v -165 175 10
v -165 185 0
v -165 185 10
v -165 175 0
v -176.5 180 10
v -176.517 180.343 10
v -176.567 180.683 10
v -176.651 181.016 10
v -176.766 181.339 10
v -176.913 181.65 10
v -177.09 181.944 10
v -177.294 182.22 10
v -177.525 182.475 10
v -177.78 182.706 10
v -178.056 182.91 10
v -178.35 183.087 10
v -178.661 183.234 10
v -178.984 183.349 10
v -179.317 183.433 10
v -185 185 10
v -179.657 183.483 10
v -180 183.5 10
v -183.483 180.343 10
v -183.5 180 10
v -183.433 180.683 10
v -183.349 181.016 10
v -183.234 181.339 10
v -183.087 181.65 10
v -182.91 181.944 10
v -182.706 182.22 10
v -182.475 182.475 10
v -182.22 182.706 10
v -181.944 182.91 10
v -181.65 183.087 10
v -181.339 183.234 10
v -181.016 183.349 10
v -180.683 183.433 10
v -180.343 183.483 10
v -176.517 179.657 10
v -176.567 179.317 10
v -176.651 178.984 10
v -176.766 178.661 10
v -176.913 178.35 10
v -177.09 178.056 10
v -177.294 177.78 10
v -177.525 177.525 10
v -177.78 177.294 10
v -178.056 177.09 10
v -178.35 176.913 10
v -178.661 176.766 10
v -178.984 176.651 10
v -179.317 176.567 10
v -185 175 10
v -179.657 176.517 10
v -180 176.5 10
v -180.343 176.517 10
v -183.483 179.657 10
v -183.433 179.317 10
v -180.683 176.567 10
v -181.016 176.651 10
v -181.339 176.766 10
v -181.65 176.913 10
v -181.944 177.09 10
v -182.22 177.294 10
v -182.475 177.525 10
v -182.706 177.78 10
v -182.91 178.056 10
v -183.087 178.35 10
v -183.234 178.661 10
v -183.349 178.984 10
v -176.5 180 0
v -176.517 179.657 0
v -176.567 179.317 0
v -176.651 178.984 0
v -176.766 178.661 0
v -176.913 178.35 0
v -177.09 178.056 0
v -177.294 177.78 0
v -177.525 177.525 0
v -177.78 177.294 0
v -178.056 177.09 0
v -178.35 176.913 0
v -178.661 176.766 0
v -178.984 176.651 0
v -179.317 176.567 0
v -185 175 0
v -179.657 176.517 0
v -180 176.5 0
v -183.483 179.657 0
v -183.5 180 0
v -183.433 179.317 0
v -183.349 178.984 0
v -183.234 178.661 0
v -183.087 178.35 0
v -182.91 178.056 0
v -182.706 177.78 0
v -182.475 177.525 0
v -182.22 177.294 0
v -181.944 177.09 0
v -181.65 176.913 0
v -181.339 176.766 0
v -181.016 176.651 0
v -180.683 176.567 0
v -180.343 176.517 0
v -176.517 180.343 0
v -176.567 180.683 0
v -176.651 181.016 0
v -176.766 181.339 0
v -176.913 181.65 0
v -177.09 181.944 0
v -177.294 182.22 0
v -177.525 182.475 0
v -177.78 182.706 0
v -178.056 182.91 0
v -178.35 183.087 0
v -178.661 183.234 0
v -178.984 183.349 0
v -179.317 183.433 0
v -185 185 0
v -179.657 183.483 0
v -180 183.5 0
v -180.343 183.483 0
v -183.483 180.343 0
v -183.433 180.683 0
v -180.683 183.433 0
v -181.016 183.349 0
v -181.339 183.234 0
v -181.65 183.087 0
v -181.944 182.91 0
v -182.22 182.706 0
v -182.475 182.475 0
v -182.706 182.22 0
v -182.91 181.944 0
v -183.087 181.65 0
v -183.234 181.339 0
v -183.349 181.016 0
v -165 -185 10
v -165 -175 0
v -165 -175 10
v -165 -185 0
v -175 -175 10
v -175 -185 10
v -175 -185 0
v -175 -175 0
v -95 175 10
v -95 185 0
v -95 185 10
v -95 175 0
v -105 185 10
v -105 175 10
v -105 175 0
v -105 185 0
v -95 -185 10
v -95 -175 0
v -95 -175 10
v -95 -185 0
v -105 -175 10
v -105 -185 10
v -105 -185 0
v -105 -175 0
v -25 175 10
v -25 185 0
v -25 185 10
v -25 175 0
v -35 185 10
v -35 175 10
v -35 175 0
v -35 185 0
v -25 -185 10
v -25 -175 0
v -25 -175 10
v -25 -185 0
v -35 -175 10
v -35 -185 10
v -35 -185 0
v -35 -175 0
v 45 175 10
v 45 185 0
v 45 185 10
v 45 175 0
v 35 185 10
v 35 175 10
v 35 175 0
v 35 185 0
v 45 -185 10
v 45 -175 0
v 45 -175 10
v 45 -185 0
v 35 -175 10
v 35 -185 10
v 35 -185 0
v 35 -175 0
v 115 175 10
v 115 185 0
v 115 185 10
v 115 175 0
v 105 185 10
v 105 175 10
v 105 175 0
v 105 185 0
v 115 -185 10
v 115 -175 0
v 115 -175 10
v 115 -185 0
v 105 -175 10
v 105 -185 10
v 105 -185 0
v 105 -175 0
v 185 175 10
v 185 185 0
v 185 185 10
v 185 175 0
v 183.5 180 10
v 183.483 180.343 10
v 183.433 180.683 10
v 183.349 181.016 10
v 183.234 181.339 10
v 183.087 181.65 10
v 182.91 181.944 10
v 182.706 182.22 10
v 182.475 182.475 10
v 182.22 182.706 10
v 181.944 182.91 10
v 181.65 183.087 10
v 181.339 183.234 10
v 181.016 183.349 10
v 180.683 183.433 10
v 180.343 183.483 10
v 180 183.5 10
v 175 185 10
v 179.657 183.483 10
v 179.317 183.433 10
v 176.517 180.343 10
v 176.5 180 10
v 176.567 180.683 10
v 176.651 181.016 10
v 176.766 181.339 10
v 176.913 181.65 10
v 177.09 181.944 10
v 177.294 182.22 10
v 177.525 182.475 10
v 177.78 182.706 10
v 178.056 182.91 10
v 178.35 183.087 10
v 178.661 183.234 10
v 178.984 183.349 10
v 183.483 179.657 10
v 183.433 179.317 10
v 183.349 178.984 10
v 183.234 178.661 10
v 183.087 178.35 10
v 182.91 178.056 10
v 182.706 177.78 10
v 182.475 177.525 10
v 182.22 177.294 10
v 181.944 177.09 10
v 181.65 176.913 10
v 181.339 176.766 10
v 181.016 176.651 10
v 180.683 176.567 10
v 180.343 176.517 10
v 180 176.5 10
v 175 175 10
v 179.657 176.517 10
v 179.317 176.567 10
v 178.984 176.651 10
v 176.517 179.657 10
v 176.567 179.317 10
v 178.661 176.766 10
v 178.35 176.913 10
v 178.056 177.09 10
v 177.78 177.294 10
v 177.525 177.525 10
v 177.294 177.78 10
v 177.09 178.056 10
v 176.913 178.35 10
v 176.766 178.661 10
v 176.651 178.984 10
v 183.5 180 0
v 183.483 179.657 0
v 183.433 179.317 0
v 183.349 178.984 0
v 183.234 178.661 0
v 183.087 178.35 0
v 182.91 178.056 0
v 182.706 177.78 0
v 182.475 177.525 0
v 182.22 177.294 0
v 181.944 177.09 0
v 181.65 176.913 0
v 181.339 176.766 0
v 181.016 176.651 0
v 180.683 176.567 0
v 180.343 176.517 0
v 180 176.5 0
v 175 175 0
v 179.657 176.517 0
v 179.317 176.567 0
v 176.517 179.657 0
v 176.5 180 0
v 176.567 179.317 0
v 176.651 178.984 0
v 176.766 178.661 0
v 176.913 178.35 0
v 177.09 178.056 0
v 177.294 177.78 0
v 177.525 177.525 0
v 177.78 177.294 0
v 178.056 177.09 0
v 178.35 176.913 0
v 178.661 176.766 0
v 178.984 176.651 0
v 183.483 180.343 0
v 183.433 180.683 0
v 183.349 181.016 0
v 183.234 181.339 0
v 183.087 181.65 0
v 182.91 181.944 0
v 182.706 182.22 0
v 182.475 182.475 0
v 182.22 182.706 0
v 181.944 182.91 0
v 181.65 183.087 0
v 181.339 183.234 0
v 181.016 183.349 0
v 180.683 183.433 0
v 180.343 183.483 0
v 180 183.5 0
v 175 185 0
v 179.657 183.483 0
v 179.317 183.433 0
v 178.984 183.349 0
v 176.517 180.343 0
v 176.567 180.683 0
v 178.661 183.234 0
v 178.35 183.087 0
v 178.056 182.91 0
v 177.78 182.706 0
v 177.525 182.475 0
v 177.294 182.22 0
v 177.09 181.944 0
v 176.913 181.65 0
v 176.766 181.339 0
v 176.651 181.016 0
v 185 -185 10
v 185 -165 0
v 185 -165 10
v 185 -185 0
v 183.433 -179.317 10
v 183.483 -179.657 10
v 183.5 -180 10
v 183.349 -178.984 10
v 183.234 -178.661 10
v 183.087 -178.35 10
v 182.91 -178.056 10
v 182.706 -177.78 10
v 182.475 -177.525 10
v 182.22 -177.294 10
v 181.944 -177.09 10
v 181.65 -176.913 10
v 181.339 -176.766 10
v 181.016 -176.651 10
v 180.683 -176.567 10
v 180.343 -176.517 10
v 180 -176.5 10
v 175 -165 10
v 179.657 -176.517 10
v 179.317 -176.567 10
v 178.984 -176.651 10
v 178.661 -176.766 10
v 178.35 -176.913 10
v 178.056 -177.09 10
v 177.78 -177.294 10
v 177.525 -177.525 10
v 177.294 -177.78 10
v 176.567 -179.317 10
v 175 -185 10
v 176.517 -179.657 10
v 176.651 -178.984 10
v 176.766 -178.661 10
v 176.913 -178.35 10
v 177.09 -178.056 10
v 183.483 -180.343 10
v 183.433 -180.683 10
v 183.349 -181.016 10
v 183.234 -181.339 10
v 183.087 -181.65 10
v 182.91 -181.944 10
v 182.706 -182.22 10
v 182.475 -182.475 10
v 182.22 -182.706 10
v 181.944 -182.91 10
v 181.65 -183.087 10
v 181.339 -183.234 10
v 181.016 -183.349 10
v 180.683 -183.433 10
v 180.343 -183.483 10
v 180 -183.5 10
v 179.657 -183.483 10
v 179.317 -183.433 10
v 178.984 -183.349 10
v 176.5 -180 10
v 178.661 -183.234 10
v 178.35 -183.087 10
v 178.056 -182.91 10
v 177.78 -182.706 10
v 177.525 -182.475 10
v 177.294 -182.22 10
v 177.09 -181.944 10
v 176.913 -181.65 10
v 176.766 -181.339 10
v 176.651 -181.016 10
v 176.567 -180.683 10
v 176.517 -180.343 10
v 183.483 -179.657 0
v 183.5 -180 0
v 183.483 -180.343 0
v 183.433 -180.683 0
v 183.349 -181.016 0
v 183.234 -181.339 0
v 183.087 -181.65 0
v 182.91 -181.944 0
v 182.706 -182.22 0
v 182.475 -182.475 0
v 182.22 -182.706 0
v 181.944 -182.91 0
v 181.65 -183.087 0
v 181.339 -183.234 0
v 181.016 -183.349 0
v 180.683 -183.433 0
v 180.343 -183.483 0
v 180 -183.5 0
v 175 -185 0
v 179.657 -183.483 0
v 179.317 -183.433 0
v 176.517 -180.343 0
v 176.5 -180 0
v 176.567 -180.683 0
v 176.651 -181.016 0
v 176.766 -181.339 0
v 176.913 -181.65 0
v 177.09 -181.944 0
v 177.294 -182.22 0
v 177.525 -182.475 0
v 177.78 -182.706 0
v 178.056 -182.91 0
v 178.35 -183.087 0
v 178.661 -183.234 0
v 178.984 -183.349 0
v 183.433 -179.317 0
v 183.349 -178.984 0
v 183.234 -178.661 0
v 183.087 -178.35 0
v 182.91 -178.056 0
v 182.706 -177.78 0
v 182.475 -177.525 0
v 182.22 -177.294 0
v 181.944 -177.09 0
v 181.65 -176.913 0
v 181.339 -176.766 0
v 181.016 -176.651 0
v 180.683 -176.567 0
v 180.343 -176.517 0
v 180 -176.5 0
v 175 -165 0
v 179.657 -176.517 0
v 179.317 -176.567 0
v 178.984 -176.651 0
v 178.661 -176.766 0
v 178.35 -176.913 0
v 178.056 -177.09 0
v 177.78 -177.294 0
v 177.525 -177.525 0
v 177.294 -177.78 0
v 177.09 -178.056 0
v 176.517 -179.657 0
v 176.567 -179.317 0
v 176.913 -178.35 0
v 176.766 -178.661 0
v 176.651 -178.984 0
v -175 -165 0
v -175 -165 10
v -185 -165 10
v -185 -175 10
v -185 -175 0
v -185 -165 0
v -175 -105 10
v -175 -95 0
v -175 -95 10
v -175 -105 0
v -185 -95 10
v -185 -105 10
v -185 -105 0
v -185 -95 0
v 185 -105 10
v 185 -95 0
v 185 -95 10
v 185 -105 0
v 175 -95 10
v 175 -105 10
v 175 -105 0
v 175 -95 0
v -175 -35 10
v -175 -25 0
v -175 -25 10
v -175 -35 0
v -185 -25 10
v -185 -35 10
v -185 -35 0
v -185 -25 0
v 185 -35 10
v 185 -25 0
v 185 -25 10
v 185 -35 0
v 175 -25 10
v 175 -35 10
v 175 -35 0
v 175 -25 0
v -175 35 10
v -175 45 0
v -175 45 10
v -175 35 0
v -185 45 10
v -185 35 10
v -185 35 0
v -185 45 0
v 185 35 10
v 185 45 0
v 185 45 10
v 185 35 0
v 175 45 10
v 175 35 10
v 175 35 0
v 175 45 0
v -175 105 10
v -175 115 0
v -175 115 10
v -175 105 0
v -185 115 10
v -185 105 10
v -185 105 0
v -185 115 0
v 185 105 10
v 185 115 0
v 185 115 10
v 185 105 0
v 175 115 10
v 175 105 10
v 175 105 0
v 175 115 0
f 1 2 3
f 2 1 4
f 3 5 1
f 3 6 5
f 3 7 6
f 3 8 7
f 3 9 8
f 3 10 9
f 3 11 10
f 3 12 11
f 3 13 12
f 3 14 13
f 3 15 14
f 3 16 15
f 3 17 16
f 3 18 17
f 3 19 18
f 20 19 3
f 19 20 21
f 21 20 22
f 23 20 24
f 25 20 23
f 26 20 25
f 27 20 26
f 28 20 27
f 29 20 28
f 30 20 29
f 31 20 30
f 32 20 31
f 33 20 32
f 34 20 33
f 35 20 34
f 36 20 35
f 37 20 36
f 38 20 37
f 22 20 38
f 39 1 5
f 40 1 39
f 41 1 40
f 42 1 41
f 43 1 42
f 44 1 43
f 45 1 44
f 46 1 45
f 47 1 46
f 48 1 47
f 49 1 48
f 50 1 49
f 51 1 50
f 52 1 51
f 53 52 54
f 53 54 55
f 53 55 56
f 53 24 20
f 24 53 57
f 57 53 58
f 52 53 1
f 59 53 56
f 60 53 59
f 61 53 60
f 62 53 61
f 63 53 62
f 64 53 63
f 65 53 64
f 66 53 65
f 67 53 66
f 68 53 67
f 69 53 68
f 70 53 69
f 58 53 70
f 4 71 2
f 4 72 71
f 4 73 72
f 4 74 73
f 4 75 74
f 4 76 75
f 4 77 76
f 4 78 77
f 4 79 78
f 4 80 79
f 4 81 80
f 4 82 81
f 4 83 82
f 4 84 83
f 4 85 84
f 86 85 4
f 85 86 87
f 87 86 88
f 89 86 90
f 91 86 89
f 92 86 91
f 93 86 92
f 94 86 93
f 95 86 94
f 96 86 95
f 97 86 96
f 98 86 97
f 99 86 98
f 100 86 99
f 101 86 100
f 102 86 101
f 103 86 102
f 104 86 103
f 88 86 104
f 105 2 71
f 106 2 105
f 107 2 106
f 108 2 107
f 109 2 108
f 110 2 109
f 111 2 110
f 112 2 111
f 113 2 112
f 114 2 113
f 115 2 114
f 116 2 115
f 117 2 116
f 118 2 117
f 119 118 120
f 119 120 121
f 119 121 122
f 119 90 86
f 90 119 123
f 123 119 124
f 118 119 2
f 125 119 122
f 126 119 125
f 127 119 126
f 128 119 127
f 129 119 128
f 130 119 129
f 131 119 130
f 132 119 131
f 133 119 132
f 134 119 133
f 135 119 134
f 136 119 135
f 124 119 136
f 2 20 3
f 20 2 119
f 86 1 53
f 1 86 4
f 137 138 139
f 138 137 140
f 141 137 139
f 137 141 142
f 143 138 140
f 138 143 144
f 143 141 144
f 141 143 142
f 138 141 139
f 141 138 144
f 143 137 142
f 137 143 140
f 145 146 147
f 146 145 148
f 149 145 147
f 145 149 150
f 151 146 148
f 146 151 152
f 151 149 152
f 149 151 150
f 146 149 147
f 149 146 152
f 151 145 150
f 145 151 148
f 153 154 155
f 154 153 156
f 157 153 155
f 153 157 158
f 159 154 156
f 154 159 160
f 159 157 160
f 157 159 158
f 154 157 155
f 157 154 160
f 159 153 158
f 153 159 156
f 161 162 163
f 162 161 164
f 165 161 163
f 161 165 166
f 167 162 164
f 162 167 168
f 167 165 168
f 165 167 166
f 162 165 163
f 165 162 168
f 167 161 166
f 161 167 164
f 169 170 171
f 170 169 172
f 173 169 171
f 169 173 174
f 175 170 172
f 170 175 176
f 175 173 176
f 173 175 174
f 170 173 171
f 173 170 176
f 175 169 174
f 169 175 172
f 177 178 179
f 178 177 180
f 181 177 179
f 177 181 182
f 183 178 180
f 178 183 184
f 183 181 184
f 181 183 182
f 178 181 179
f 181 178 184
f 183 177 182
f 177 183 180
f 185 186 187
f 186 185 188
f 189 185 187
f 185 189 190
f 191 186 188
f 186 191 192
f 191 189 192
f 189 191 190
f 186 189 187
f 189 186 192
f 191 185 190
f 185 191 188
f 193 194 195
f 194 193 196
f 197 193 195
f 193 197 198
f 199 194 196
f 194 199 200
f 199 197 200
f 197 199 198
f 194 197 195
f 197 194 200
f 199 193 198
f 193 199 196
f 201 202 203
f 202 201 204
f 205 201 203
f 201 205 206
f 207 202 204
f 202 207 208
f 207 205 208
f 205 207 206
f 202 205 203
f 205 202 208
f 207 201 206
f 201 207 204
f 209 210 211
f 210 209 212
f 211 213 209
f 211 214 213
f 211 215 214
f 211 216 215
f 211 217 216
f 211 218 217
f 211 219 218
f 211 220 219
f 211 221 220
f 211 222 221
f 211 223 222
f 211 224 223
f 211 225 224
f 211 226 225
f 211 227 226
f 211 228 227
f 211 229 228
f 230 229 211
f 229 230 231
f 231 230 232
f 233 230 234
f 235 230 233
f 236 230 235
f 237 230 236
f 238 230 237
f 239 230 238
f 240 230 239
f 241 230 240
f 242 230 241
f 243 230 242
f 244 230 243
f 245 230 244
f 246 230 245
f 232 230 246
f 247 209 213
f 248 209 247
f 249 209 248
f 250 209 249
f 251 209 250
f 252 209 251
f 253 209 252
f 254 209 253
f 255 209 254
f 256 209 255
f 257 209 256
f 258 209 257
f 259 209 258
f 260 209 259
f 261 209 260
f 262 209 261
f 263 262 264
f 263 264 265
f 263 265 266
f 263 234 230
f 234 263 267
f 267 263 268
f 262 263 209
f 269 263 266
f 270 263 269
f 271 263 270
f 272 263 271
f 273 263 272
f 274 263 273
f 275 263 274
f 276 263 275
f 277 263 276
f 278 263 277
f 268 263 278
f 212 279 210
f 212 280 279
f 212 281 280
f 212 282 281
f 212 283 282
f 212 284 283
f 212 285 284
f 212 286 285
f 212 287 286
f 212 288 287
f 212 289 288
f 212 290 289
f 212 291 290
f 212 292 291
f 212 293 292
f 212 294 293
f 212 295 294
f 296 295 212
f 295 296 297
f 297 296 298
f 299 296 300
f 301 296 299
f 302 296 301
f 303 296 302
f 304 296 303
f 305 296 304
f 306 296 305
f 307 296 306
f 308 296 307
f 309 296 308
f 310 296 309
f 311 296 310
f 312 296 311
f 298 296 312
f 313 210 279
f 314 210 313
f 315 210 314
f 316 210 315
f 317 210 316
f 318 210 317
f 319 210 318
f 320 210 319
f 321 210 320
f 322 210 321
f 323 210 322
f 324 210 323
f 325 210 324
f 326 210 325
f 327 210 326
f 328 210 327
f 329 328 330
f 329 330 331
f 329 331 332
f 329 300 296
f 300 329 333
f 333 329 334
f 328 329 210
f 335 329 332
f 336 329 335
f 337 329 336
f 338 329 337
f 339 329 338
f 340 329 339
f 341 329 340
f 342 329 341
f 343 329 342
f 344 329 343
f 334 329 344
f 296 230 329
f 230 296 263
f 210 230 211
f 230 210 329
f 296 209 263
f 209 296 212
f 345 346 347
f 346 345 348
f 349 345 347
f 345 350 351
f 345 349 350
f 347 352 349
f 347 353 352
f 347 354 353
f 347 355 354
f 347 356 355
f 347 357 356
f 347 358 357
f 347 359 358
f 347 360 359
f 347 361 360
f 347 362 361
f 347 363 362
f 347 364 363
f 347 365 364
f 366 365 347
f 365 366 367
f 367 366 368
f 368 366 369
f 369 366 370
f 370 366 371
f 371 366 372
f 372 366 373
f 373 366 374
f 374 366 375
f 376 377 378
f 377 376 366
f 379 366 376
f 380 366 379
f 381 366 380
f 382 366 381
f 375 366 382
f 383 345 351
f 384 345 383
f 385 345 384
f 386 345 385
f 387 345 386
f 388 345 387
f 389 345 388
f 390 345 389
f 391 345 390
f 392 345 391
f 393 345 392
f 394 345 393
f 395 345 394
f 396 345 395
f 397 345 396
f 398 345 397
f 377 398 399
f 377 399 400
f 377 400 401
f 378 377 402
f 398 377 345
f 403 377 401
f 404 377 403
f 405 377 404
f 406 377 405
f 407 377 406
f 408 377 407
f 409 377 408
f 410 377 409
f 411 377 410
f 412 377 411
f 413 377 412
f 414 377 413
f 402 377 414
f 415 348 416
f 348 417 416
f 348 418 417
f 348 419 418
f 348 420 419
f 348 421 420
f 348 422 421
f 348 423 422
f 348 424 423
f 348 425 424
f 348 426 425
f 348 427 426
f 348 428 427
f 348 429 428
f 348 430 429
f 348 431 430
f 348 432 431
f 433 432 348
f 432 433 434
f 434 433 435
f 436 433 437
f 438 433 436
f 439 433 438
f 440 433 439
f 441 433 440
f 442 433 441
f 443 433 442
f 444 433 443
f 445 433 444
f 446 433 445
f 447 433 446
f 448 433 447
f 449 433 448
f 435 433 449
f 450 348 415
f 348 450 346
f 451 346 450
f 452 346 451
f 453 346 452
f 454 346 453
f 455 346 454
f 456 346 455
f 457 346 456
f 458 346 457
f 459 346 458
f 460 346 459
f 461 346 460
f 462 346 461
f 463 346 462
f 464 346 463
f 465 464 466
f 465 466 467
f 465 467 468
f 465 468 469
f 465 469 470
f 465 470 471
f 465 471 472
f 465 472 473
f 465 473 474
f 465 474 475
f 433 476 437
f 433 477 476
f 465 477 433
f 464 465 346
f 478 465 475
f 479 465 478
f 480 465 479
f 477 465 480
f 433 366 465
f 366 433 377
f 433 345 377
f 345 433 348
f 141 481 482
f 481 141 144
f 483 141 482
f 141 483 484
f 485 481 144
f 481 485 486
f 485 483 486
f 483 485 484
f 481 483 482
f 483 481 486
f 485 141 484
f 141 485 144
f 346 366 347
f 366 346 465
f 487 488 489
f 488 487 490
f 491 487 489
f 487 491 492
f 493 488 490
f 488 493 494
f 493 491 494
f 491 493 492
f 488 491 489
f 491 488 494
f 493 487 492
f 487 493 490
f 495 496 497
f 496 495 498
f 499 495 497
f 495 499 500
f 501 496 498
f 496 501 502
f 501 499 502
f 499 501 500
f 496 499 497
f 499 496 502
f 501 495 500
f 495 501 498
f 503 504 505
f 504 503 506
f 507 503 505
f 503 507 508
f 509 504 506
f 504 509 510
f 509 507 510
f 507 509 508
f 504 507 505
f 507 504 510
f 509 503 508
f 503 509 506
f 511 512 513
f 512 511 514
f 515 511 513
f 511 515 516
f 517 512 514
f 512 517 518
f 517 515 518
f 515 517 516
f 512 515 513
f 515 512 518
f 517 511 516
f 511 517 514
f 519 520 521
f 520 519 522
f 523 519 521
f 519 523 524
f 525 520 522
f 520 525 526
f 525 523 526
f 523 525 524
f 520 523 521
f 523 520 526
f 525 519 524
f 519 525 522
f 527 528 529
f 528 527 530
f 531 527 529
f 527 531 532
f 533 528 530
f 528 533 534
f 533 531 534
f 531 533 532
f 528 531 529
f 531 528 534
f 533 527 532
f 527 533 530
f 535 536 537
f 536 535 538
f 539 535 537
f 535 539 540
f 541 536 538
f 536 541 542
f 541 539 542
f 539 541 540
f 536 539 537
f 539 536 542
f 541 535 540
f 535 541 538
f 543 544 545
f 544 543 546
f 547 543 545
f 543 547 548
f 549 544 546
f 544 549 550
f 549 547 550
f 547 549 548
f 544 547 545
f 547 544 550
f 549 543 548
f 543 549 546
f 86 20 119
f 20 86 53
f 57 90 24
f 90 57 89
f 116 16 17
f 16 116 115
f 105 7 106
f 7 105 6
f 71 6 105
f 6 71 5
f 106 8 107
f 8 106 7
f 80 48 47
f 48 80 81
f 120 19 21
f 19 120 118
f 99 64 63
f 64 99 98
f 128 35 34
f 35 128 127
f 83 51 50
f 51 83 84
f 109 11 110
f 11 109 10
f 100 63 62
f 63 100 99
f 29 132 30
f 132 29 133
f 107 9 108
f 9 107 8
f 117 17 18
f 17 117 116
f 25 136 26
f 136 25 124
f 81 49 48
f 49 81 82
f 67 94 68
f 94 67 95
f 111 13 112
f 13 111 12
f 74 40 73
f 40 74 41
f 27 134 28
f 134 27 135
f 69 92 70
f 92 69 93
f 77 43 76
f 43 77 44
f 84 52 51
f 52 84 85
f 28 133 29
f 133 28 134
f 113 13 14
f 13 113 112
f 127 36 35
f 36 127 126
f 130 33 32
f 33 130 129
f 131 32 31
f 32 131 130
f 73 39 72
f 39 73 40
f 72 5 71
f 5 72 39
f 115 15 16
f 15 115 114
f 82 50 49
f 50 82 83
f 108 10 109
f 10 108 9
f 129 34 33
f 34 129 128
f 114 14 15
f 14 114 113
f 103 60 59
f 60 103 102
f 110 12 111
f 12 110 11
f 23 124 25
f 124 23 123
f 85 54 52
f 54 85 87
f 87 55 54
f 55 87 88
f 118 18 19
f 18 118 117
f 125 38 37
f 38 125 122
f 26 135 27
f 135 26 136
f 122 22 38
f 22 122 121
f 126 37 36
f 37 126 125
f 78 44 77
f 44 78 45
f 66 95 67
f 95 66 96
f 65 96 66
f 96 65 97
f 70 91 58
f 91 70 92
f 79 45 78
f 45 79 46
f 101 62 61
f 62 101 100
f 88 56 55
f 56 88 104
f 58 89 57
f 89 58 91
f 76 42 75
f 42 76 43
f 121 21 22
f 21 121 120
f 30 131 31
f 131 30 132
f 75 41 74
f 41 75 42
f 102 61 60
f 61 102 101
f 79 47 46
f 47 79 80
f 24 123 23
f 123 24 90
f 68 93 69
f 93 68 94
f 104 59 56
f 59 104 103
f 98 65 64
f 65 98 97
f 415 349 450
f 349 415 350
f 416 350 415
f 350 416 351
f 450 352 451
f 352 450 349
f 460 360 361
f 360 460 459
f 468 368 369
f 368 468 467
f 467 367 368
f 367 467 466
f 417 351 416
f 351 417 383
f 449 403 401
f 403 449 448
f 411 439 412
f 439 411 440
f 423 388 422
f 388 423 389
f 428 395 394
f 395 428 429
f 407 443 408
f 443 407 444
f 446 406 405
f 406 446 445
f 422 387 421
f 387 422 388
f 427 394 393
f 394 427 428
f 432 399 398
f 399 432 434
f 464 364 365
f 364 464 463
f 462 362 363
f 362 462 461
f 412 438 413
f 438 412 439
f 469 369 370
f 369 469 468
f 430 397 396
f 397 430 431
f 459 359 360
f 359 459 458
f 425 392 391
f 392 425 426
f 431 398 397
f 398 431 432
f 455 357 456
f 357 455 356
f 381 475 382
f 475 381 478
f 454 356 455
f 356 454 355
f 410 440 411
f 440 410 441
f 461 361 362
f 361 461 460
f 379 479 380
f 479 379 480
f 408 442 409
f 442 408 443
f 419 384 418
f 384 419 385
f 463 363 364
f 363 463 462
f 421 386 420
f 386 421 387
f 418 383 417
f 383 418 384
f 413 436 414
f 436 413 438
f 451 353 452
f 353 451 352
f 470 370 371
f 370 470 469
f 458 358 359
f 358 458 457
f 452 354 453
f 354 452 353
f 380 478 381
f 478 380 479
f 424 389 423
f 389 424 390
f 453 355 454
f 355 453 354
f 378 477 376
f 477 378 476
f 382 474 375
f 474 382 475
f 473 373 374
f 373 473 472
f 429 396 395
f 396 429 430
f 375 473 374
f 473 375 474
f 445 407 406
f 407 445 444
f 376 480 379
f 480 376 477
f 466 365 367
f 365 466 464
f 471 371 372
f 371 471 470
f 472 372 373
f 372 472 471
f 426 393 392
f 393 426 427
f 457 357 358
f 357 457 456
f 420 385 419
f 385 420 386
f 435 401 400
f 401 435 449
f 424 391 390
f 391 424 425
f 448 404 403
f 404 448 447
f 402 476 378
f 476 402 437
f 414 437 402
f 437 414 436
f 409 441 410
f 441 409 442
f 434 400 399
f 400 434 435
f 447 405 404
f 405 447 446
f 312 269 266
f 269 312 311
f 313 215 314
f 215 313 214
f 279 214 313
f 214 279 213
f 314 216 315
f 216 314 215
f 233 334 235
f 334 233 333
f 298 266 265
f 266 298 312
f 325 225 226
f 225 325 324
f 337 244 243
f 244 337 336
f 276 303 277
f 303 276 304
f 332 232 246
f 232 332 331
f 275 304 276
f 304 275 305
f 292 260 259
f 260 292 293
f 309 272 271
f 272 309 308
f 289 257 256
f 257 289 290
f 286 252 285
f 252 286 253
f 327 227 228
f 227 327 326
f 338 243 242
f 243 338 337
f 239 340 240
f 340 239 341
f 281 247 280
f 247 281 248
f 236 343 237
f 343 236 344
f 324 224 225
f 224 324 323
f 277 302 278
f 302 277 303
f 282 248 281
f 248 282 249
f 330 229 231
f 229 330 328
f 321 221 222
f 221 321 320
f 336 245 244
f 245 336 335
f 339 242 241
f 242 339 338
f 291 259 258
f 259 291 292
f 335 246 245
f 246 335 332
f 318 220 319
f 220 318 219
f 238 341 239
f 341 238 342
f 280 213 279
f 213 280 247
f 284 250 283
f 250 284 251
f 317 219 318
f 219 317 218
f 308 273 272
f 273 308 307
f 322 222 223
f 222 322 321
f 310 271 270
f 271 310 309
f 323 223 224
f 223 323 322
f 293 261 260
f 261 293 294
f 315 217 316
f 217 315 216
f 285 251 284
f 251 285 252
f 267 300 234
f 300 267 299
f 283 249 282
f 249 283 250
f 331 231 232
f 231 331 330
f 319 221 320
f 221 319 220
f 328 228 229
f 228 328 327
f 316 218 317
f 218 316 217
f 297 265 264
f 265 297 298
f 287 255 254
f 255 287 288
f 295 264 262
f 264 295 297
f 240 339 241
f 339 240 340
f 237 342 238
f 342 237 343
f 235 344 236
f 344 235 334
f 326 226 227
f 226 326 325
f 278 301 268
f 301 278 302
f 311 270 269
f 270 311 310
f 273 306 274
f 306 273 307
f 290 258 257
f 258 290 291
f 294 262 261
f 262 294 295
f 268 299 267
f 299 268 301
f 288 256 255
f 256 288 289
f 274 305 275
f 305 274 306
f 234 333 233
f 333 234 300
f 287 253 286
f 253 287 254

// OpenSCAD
// ring_40.scad - ring index 40 (z bottom = 400 mm)
$fn = 64; bar = 10; half_b = bar/2; outer = 370; half_outer = outer/2;
front_y = 180; back_y = -180; left_x = -180; right_x = 180;
x_centers = [-170, -100, -30, 40, 110, 180];
z_centers = [5, 85, 155, 225, 295, 365, 435, 505, 575, 645, 715]; ring_z = 400;
module place_box(cx, cy, sx, sy) { translate([cx - sx/2, cy - sy/2, 0]) cube([sx, sy, bar]); }

difference() { union() {
    for (x = x_centers) { place_box(x, front_y, bar, bar); place_box(x, back_y, bar, bar); }
    for (y = x_centers) { place_box(left_x, y, bar, bar); place_box(right_x, y, bar, bar); }
    for (zc = z_centers) if ((zc - half_b < ring_z + bar) && (zc + half_b > ring_z)) {
        translate([-half_outer, front_y - half_b, 0]) cube([outer, bar, bar]);
        translate([-half_outer, back_y - half_b, 0])  cube([outer, bar, bar]);
        translate([left_x - half_b, -half_outer, 0])  cube([bar, outer, bar]);
        translate([right_x - half_b, -half_outer, 0]) cube([bar, outer, bar]);
    }
  }
  for (cx = [-180, 180]) for (cy = [-180, 180]) translate([cx, cy, 0]) cylinder(h = bar, r = 3.5, $fn = 64);
}
